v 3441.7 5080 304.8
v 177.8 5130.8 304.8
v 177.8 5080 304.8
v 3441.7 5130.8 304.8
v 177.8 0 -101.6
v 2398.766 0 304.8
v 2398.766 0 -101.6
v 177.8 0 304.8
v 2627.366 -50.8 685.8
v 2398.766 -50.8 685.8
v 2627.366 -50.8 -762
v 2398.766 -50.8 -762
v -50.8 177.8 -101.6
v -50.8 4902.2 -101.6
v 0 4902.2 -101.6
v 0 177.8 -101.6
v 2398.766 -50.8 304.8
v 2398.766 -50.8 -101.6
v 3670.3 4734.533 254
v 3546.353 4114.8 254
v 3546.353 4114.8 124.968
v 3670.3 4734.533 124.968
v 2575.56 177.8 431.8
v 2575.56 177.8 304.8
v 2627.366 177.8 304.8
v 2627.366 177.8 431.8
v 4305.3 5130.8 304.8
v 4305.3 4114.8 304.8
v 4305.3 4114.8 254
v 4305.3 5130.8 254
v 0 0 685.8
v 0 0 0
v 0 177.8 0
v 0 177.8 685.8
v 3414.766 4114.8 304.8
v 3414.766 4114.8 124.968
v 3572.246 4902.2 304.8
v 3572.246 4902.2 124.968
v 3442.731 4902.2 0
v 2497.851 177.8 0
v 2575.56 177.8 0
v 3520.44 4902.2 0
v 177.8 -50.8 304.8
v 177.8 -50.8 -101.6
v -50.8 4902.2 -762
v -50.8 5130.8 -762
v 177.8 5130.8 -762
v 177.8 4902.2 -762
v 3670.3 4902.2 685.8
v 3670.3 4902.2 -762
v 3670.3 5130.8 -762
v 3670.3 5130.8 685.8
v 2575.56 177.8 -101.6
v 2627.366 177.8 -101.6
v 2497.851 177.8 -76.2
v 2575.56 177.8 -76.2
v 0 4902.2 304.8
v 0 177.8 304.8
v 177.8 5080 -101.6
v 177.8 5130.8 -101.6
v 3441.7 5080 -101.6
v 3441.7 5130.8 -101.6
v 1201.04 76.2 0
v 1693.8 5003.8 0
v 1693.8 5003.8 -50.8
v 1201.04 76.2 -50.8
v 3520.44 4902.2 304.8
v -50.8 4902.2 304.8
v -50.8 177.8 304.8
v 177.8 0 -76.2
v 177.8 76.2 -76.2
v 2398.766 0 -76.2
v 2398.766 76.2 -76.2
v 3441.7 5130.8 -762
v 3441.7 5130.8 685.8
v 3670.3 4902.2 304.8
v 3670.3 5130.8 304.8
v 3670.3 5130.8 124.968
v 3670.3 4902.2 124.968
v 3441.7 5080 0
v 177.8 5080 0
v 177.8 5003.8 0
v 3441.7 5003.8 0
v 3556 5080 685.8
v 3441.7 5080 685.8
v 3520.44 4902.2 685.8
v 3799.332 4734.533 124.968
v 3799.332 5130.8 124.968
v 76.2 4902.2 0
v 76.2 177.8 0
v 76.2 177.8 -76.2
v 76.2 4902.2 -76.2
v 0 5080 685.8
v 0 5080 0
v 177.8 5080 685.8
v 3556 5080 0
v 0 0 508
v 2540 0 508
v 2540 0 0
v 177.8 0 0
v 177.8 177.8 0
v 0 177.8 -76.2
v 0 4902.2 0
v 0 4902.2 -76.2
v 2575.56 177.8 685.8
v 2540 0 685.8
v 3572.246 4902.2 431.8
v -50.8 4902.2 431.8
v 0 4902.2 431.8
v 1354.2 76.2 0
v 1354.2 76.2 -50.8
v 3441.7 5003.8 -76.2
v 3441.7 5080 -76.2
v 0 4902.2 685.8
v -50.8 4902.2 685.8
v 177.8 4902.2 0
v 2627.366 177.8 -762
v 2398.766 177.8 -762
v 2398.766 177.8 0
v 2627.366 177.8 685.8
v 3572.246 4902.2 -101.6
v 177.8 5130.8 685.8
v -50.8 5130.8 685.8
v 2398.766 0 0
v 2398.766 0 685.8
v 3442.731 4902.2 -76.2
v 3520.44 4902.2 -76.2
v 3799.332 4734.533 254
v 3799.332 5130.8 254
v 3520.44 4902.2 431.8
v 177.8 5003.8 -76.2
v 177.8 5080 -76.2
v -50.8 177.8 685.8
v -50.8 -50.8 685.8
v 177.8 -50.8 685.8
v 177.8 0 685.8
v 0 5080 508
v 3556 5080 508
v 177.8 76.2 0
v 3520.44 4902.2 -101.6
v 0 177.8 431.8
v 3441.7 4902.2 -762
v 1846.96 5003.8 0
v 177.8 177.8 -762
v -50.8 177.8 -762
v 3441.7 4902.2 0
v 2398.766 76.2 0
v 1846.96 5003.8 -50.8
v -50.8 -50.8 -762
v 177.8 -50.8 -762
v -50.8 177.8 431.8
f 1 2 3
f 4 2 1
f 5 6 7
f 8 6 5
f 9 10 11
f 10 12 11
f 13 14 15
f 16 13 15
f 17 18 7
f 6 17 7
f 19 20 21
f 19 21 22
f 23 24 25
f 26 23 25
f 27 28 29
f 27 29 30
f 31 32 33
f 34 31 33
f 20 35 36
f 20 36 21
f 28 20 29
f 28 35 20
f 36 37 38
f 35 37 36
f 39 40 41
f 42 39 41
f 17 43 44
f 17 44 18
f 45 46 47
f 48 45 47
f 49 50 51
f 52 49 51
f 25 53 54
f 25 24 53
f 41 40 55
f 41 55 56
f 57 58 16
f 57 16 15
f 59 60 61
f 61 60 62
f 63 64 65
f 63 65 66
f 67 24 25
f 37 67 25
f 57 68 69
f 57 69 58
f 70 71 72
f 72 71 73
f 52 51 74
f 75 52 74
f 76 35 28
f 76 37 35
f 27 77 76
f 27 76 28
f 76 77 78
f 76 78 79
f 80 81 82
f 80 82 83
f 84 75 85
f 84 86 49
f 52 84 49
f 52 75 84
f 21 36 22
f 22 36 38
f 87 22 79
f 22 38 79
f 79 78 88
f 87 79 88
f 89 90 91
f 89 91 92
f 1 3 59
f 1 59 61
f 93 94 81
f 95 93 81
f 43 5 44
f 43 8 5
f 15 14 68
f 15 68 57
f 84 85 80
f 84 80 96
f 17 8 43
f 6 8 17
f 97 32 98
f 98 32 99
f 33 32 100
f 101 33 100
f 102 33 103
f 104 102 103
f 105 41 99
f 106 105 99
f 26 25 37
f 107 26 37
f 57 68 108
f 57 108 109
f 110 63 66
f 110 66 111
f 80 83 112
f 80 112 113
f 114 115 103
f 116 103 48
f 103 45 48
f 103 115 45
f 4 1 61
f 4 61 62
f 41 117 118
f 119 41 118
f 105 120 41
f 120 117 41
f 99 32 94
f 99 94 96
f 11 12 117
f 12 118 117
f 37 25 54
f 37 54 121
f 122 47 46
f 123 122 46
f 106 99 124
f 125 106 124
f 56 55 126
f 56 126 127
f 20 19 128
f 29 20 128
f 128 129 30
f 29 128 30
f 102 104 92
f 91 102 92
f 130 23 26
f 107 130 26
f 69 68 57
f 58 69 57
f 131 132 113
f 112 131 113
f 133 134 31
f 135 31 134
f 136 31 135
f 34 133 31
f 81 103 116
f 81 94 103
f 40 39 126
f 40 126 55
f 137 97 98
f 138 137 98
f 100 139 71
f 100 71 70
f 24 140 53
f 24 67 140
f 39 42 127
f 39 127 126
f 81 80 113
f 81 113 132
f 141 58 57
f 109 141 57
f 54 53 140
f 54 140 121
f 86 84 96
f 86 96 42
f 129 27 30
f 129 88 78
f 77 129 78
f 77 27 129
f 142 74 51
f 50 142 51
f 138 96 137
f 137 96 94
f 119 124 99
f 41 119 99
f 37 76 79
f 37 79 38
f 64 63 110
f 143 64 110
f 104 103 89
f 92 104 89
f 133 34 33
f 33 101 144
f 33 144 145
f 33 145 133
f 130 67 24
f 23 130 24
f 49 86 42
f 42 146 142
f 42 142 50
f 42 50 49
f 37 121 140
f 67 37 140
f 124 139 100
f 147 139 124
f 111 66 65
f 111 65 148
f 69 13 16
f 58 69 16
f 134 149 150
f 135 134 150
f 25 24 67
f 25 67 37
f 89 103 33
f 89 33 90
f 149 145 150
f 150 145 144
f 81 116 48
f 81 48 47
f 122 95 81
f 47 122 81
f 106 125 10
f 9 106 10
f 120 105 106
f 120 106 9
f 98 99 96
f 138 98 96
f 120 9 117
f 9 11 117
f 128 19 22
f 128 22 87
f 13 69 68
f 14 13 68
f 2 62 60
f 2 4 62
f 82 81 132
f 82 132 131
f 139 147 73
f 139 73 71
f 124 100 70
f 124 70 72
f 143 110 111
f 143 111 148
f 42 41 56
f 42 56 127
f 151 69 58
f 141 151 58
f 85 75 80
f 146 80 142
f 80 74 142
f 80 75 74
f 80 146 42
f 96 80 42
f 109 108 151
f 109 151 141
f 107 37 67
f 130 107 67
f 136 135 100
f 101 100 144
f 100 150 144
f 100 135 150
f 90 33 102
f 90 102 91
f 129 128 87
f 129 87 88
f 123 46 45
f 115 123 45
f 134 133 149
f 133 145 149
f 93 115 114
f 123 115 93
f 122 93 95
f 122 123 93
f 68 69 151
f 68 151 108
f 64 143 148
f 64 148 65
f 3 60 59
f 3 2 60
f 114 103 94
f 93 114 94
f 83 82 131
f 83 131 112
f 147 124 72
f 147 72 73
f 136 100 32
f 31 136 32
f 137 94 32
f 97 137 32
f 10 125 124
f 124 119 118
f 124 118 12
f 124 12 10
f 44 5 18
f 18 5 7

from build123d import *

# Parameters (mm, degrees)
F1_DEPTH      = 762
F2_DEPTH      = 685.8
F0_W          = 50.8
F0_H          = 4724.4
F3_DEPTH      = 304.8
F3_DEPTH_BACK = 101.6
F5_DEPTH      = 179.832
F6_DEPTH      = 50.8
F0_W_2        = 76.2
F7_DEPTH      = 76.2
F8_DEPTH      = 508
F9_DEPTH      = 127
F10_DEPTH     = 50.8


with BuildPart() as f1:
    # F0 (on Top) → F1 (new body)
    with BuildSketch(Plane.XY):
        Polygon((2398.7660382581, 0), (2398.7660382581, -50.8), (2627.3660382581, -50.8), (2627.3660382581, 177.8), (2575.56, 177.8), (2540, 0), align=None)
        Polygon((2398.7660382581, 76.2), (2398.7660382581, 0), (2540, 0), (2575.56, 177.8), (2497.8509426128, 177.8), (2398.7660382581, 177.8), align=None)
    extrude(amount=-F1_DEPTH)

    # F0 (on Top) → F2, piece 2 (join)
    with BuildSketch(Plane.XY):
        Polygon((2398.7660382581, 0), (2398.7660382581, -50.8), (2627.3660382581, -50.8), (2627.3660382581, 177.8), (2575.56, 177.8), (2540, 0), align=None)
    extrude(amount=F2_DEPTH)


with BuildPart() as f1b:
    # F0 (on Top) → F1, piece 2 (new body)
    with BuildSketch(Plane.XY):
        Polygon((3670.3, 5130.8), (3441.7, 5130.8), (3441.7, 5080), (3556, 5080), (3520.44, 4902.2), (3572.2460382581, 4902.2), (3670.3, 4902.2), align=None)
        Polygon((3441.7, 5080), (3441.7, 5003.8), (3441.7, 4902.2), (3442.7309426128, 4902.2), (3520.44, 4902.2), (3556, 5080), align=None)
    extrude(amount=-F1_DEPTH)

    # F0 (on Top) → F2, piece 3 (join)
    with BuildSketch(Plane.XY):
        Polygon((3670.3, 5130.8), (3441.7, 5130.8), (3441.7, 5080), (3556, 5080), (3520.44, 4902.2), (3572.2460382581, 4902.2), (3670.3, 4902.2), align=None)
    extrude(amount=F2_DEPTH)


with BuildPart() as f1c:
    # F0 (on Top) → F1, piece 3 (new body)
    with BuildSketch(Plane.XY):
        Polygon((177.8, 0), (0, 0), (0, 177.8), (-50.8, 177.8), (-50.8, -50.8), (177.8, -50.8), align=None)
        Polygon((0, 177.8), (0, 0), (177.8, 0), (177.8, 76.2), (177.8, 177.8), (76.2, 177.8), align=None)
    extrude(amount=-F1_DEPTH)

    # F0 (on Top) → F2 (join)
    with BuildSketch(Plane.XY):
        Polygon((177.8, 0), (0, 0), (0, 177.8), (-50.8, 177.8), (-50.8, -50.8), (177.8, -50.8), align=None)
    extrude(amount=F2_DEPTH)


with BuildPart() as f1d:
    # F0 (on Top) → F1, piece 4 (new body)
    with BuildSketch(Plane.XY):
        Polygon((0, 5080), (0, 4902.2), (76.2, 4902.2), (177.8, 4902.2), (177.8, 5003.8), (177.8, 5080), align=None)
        Polygon((-50.8, 4902.2), (0, 4902.2), (0, 5080), (177.8, 5080), (177.8, 5130.8), (-50.8, 5130.8), align=None)
    extrude(amount=-F1_DEPTH)

    # F0 (on Top) → F2, piece 4 (join)
    with BuildSketch(Plane.XY):
        Polygon((-50.8, 4902.2), (0, 4902.2), (0, 5080), (177.8, 5080), (177.8, 5130.8), (-50.8, 5130.8), align=None)
    extrude(amount=F2_DEPTH)


with BuildPart() as f3:
    # F0 (on Top) → F3 (new body, two sides)
    with BuildSketch(Plane.XY) as f3_sk:
        with Locations((-25.4, 2540)):
            Rectangle(F0_W, F0_H)
    extrude(amount=F3_DEPTH)
    extrude(f3_sk.sketch, amount=-F3_DEPTH_BACK)


with BuildPart() as f3b:
    # F0 (on Top) → F3, piece 2 (new body, two sides)
    with BuildSketch(Plane.XY) as f3_2_sk:
        Polygon((177.8, 5130.8), (177.8, 5080), (1701.4199477671, 5080), (1854.5800522329, 5080), (3441.7, 5080), (3441.7, 5130.8), align=None)
    extrude(amount=F3_DEPTH)
    extrude(f3_2_sk.sketch, amount=-F3_DEPTH_BACK)


with BuildPart() as f3c:
    # F0 (on Top) → F3, piece 3 (new body, two sides)
    with BuildSketch(Plane.XY) as f3_3_sk:
        Polygon((2575.56, 177.8), (2627.3660382581, 177.8), (3572.2460382581, 4902.2), (3520.44, 4902.2), align=None)
    extrude(amount=F3_DEPTH)
    extrude(f3_3_sk.sketch, amount=-F3_DEPTH_BACK)


with BuildPart() as f3d:
    # F0 (on Top) → F3, piece 4 (new body, two sides)
    with BuildSketch(Plane.XY) as f3_4_sk:
        Polygon((1193.4199477671, 0), (177.8, 0), (177.8, -50.8), (2398.7660382581, -50.8), (2398.7660382581, 0), (1346.5800522329, 0), align=None)
    extrude(amount=F3_DEPTH)
    extrude(f3_4_sk.sketch, amount=-F3_DEPTH_BACK)


with BuildPart() as f5:
    # F4 (on face) → F5 (new body)
    with BuildSketch(Plane.XY.offset(304.8)):
        Polygon((3670.3, 5130.8), (3670.3, 4902.2), (3670.3, 4734.5331228316), (3799.332, 4734.5331228316), (3799.332, 5130.8), align=None)
        Polygon((3670.3, 4734.5331228316), (3670.3, 4902.2), (3616.9708189392, 4902.2), (3572.2460382581, 4902.2), (3414.7660382581, 4114.8), (3546.3533754337, 4114.8), align=None)
    extrude(amount=-F5_DEPTH)

    # F4 (on face) → F6 (join)
    with BuildSketch(Plane.XY.offset(304.8)):
        Polygon((3799.332, 4734.5331228316), (3670.3, 4734.5331228316), (3546.3533754337, 4114.8), (4305.3, 4114.8), (4305.3, 5130.8), (3799.332, 5130.8), align=None)
    extrude(amount=-F6_DEPTH)


with BuildPart() as f7:
    # F0 (on Top) → F7 (new body)
    with BuildSketch(Plane.XY):
        with Locations((38.1, 2540)):
            Rectangle(F0_W_2, F0_H)
    extrude(amount=-F7_DEPTH)


with BuildPart() as f7b:
    # F0 (on Top) → F7, piece 2 (new body)
    with BuildSketch(Plane.XY):
        Polygon((1701.4199477671, 5080), (177.8, 5080), (177.8, 5003.8), (1693.7999477671, 5003.8), align=None)
        Polygon((1701.4199477671, 5080), (1693.7999477671, 5003.8), (1846.9600522329, 5003.8), (1854.5800522329, 5080), align=None)
        Polygon((1854.5800522329, 5080), (1846.9600522329, 5003.8), (3441.7, 5003.8), (3441.7, 5080), align=None)
    extrude(amount=-F7_DEPTH)


with BuildPart() as f7c:
    # F0 (on Top) → F7, piece 3 (new body)
    with BuildSketch(Plane.XY):
        Polygon((2497.8509426128, 177.8), (2575.56, 177.8), (3520.44, 4902.2), (3442.7309426128, 4902.2), align=None)
    extrude(amount=-F7_DEPTH)


with BuildPart() as f7d:
    # F0 (on Top) → F7, piece 4 (new body)
    with BuildSketch(Plane.XY):
        Polygon((177.8, 76.2), (177.8, 0), (1193.4199477671, 0), (1201.0399477671, 76.2), align=None)
        Polygon((1201.0399477671, 76.2), (1193.4199477671, 0), (1346.5800522329, 0), (1354.2000522329, 76.2), align=None)
        Polygon((1354.2000522329, 76.2), (1346.5800522329, 0), (2398.7660382581, 0), (2398.7660382581, 76.2), align=None)
    extrude(amount=-F7_DEPTH)


with BuildPart() as f8:
    # F0 (on Top) → F8 (new body)
    with BuildSketch(Plane.XY):
        with Locations((38.1, 2540)):
            Rectangle(F0_W_2, F0_H)
        Polygon((0, 5080), (0, 4902.2), (76.2, 4902.2), (177.8, 4902.2), (177.8, 5003.8), (177.8, 5080), align=None)
        Polygon((1701.4199477671, 5080), (177.8, 5080), (177.8, 5003.8), (1693.7999477671, 5003.8), align=None)
        Polygon((1701.4199477671, 5080), (1693.7999477671, 5003.8), (1846.9600522329, 5003.8), (1854.5800522329, 5080), align=None)
        Polygon((1854.5800522329, 5080), (1846.9600522329, 5003.8), (3441.7, 5003.8), (3441.7, 5080), align=None)
        Polygon((76.2, 4902.2), (76.2, 177.8), (177.8, 177.8), (177.8, 76.2), (1201.0399477671, 76.2), (1693.7999477671, 5003.8), (177.8, 5003.8), (177.8, 4902.2), align=None)
        Polygon((2497.8509426128, 177.8), (2575.56, 177.8), (3520.44, 4902.2), (3442.7309426128, 4902.2), align=None)
        Polygon((2398.7660382581, 76.2), (2398.7660382581, 0), (2540, 0), (2575.56, 177.8), (2497.8509426128, 177.8), (2398.7660382581, 177.8), align=None)
        Polygon((177.8, 76.2), (177.8, 0), (1193.4199477671, 0), (1201.0399477671, 76.2), align=None)
        Polygon((1201.0399477671, 76.2), (1193.4199477671, 0), (1346.5800522329, 0), (1354.2000522329, 76.2), align=None)
        Polygon((1354.2000522329, 76.2), (1346.5800522329, 0), (2398.7660382581, 0), (2398.7660382581, 76.2), align=None)
        Polygon((0, 177.8), (0, 0), (177.8, 0), (177.8, 76.2), (177.8, 177.8), (76.2, 177.8), align=None)
        Polygon((3441.7, 5080), (3441.7, 5003.8), (3441.7, 4902.2), (3442.7309426128, 4902.2), (3520.44, 4902.2), (3556, 5080), align=None)
        Polygon((1693.7999477671, 5003.8), (1201.0399477671, 76.2), (1354.2000522329, 76.2), (1846.9600522329, 5003.8), align=None)
        Polygon((1846.9600522329, 5003.8), (1354.2000522329, 76.2), (2398.7660382581, 76.2), (2398.7660382581, 177.8), (2497.8509426128, 177.8), (3442.7309426128, 4902.2), (3441.7, 4902.2), (3441.7, 5003.8), align=None)
    extrude(amount=F8_DEPTH)


with BuildPart() as f9:
    # F9 (new): a face of the model
    f9_faces = [f3c.part.faces().sort_by_distance(p)[0] for p in [
        (3073.9030191291, 2540, 304.8),
    ]]
    extrude(f9_faces, amount=F9_DEPTH)


with BuildPart() as f9b:
    # F9#2 (new): a face of the model
    f9_2_faces = [f3.part.faces().sort_by_distance(p)[0] for p in [
        (-25.4, 2540, 304.8),
    ]]
    extrude(f9_2_faces, amount=F9_DEPTH)


with BuildPart() as f10:
    # F0 (on Top) → F10 (new body)
    with BuildSketch(Plane.XY):
        Polygon((1693.7999477671, 5003.8), (1201.0399477671, 76.2), (1354.2000522329, 76.2), (1846.9600522329, 5003.8), align=None)
    extrude(amount=-F10_DEPTH)


solid = Compound([f1.part, f1b.part, f1c.part, f1d.part, f3.part, f3b.part, f3c.part, f3d.part, f5.part, f7.part, f7b.part, f7c.part, f7d.part, f8.part, f9.part, f9b.part, f10.part])
